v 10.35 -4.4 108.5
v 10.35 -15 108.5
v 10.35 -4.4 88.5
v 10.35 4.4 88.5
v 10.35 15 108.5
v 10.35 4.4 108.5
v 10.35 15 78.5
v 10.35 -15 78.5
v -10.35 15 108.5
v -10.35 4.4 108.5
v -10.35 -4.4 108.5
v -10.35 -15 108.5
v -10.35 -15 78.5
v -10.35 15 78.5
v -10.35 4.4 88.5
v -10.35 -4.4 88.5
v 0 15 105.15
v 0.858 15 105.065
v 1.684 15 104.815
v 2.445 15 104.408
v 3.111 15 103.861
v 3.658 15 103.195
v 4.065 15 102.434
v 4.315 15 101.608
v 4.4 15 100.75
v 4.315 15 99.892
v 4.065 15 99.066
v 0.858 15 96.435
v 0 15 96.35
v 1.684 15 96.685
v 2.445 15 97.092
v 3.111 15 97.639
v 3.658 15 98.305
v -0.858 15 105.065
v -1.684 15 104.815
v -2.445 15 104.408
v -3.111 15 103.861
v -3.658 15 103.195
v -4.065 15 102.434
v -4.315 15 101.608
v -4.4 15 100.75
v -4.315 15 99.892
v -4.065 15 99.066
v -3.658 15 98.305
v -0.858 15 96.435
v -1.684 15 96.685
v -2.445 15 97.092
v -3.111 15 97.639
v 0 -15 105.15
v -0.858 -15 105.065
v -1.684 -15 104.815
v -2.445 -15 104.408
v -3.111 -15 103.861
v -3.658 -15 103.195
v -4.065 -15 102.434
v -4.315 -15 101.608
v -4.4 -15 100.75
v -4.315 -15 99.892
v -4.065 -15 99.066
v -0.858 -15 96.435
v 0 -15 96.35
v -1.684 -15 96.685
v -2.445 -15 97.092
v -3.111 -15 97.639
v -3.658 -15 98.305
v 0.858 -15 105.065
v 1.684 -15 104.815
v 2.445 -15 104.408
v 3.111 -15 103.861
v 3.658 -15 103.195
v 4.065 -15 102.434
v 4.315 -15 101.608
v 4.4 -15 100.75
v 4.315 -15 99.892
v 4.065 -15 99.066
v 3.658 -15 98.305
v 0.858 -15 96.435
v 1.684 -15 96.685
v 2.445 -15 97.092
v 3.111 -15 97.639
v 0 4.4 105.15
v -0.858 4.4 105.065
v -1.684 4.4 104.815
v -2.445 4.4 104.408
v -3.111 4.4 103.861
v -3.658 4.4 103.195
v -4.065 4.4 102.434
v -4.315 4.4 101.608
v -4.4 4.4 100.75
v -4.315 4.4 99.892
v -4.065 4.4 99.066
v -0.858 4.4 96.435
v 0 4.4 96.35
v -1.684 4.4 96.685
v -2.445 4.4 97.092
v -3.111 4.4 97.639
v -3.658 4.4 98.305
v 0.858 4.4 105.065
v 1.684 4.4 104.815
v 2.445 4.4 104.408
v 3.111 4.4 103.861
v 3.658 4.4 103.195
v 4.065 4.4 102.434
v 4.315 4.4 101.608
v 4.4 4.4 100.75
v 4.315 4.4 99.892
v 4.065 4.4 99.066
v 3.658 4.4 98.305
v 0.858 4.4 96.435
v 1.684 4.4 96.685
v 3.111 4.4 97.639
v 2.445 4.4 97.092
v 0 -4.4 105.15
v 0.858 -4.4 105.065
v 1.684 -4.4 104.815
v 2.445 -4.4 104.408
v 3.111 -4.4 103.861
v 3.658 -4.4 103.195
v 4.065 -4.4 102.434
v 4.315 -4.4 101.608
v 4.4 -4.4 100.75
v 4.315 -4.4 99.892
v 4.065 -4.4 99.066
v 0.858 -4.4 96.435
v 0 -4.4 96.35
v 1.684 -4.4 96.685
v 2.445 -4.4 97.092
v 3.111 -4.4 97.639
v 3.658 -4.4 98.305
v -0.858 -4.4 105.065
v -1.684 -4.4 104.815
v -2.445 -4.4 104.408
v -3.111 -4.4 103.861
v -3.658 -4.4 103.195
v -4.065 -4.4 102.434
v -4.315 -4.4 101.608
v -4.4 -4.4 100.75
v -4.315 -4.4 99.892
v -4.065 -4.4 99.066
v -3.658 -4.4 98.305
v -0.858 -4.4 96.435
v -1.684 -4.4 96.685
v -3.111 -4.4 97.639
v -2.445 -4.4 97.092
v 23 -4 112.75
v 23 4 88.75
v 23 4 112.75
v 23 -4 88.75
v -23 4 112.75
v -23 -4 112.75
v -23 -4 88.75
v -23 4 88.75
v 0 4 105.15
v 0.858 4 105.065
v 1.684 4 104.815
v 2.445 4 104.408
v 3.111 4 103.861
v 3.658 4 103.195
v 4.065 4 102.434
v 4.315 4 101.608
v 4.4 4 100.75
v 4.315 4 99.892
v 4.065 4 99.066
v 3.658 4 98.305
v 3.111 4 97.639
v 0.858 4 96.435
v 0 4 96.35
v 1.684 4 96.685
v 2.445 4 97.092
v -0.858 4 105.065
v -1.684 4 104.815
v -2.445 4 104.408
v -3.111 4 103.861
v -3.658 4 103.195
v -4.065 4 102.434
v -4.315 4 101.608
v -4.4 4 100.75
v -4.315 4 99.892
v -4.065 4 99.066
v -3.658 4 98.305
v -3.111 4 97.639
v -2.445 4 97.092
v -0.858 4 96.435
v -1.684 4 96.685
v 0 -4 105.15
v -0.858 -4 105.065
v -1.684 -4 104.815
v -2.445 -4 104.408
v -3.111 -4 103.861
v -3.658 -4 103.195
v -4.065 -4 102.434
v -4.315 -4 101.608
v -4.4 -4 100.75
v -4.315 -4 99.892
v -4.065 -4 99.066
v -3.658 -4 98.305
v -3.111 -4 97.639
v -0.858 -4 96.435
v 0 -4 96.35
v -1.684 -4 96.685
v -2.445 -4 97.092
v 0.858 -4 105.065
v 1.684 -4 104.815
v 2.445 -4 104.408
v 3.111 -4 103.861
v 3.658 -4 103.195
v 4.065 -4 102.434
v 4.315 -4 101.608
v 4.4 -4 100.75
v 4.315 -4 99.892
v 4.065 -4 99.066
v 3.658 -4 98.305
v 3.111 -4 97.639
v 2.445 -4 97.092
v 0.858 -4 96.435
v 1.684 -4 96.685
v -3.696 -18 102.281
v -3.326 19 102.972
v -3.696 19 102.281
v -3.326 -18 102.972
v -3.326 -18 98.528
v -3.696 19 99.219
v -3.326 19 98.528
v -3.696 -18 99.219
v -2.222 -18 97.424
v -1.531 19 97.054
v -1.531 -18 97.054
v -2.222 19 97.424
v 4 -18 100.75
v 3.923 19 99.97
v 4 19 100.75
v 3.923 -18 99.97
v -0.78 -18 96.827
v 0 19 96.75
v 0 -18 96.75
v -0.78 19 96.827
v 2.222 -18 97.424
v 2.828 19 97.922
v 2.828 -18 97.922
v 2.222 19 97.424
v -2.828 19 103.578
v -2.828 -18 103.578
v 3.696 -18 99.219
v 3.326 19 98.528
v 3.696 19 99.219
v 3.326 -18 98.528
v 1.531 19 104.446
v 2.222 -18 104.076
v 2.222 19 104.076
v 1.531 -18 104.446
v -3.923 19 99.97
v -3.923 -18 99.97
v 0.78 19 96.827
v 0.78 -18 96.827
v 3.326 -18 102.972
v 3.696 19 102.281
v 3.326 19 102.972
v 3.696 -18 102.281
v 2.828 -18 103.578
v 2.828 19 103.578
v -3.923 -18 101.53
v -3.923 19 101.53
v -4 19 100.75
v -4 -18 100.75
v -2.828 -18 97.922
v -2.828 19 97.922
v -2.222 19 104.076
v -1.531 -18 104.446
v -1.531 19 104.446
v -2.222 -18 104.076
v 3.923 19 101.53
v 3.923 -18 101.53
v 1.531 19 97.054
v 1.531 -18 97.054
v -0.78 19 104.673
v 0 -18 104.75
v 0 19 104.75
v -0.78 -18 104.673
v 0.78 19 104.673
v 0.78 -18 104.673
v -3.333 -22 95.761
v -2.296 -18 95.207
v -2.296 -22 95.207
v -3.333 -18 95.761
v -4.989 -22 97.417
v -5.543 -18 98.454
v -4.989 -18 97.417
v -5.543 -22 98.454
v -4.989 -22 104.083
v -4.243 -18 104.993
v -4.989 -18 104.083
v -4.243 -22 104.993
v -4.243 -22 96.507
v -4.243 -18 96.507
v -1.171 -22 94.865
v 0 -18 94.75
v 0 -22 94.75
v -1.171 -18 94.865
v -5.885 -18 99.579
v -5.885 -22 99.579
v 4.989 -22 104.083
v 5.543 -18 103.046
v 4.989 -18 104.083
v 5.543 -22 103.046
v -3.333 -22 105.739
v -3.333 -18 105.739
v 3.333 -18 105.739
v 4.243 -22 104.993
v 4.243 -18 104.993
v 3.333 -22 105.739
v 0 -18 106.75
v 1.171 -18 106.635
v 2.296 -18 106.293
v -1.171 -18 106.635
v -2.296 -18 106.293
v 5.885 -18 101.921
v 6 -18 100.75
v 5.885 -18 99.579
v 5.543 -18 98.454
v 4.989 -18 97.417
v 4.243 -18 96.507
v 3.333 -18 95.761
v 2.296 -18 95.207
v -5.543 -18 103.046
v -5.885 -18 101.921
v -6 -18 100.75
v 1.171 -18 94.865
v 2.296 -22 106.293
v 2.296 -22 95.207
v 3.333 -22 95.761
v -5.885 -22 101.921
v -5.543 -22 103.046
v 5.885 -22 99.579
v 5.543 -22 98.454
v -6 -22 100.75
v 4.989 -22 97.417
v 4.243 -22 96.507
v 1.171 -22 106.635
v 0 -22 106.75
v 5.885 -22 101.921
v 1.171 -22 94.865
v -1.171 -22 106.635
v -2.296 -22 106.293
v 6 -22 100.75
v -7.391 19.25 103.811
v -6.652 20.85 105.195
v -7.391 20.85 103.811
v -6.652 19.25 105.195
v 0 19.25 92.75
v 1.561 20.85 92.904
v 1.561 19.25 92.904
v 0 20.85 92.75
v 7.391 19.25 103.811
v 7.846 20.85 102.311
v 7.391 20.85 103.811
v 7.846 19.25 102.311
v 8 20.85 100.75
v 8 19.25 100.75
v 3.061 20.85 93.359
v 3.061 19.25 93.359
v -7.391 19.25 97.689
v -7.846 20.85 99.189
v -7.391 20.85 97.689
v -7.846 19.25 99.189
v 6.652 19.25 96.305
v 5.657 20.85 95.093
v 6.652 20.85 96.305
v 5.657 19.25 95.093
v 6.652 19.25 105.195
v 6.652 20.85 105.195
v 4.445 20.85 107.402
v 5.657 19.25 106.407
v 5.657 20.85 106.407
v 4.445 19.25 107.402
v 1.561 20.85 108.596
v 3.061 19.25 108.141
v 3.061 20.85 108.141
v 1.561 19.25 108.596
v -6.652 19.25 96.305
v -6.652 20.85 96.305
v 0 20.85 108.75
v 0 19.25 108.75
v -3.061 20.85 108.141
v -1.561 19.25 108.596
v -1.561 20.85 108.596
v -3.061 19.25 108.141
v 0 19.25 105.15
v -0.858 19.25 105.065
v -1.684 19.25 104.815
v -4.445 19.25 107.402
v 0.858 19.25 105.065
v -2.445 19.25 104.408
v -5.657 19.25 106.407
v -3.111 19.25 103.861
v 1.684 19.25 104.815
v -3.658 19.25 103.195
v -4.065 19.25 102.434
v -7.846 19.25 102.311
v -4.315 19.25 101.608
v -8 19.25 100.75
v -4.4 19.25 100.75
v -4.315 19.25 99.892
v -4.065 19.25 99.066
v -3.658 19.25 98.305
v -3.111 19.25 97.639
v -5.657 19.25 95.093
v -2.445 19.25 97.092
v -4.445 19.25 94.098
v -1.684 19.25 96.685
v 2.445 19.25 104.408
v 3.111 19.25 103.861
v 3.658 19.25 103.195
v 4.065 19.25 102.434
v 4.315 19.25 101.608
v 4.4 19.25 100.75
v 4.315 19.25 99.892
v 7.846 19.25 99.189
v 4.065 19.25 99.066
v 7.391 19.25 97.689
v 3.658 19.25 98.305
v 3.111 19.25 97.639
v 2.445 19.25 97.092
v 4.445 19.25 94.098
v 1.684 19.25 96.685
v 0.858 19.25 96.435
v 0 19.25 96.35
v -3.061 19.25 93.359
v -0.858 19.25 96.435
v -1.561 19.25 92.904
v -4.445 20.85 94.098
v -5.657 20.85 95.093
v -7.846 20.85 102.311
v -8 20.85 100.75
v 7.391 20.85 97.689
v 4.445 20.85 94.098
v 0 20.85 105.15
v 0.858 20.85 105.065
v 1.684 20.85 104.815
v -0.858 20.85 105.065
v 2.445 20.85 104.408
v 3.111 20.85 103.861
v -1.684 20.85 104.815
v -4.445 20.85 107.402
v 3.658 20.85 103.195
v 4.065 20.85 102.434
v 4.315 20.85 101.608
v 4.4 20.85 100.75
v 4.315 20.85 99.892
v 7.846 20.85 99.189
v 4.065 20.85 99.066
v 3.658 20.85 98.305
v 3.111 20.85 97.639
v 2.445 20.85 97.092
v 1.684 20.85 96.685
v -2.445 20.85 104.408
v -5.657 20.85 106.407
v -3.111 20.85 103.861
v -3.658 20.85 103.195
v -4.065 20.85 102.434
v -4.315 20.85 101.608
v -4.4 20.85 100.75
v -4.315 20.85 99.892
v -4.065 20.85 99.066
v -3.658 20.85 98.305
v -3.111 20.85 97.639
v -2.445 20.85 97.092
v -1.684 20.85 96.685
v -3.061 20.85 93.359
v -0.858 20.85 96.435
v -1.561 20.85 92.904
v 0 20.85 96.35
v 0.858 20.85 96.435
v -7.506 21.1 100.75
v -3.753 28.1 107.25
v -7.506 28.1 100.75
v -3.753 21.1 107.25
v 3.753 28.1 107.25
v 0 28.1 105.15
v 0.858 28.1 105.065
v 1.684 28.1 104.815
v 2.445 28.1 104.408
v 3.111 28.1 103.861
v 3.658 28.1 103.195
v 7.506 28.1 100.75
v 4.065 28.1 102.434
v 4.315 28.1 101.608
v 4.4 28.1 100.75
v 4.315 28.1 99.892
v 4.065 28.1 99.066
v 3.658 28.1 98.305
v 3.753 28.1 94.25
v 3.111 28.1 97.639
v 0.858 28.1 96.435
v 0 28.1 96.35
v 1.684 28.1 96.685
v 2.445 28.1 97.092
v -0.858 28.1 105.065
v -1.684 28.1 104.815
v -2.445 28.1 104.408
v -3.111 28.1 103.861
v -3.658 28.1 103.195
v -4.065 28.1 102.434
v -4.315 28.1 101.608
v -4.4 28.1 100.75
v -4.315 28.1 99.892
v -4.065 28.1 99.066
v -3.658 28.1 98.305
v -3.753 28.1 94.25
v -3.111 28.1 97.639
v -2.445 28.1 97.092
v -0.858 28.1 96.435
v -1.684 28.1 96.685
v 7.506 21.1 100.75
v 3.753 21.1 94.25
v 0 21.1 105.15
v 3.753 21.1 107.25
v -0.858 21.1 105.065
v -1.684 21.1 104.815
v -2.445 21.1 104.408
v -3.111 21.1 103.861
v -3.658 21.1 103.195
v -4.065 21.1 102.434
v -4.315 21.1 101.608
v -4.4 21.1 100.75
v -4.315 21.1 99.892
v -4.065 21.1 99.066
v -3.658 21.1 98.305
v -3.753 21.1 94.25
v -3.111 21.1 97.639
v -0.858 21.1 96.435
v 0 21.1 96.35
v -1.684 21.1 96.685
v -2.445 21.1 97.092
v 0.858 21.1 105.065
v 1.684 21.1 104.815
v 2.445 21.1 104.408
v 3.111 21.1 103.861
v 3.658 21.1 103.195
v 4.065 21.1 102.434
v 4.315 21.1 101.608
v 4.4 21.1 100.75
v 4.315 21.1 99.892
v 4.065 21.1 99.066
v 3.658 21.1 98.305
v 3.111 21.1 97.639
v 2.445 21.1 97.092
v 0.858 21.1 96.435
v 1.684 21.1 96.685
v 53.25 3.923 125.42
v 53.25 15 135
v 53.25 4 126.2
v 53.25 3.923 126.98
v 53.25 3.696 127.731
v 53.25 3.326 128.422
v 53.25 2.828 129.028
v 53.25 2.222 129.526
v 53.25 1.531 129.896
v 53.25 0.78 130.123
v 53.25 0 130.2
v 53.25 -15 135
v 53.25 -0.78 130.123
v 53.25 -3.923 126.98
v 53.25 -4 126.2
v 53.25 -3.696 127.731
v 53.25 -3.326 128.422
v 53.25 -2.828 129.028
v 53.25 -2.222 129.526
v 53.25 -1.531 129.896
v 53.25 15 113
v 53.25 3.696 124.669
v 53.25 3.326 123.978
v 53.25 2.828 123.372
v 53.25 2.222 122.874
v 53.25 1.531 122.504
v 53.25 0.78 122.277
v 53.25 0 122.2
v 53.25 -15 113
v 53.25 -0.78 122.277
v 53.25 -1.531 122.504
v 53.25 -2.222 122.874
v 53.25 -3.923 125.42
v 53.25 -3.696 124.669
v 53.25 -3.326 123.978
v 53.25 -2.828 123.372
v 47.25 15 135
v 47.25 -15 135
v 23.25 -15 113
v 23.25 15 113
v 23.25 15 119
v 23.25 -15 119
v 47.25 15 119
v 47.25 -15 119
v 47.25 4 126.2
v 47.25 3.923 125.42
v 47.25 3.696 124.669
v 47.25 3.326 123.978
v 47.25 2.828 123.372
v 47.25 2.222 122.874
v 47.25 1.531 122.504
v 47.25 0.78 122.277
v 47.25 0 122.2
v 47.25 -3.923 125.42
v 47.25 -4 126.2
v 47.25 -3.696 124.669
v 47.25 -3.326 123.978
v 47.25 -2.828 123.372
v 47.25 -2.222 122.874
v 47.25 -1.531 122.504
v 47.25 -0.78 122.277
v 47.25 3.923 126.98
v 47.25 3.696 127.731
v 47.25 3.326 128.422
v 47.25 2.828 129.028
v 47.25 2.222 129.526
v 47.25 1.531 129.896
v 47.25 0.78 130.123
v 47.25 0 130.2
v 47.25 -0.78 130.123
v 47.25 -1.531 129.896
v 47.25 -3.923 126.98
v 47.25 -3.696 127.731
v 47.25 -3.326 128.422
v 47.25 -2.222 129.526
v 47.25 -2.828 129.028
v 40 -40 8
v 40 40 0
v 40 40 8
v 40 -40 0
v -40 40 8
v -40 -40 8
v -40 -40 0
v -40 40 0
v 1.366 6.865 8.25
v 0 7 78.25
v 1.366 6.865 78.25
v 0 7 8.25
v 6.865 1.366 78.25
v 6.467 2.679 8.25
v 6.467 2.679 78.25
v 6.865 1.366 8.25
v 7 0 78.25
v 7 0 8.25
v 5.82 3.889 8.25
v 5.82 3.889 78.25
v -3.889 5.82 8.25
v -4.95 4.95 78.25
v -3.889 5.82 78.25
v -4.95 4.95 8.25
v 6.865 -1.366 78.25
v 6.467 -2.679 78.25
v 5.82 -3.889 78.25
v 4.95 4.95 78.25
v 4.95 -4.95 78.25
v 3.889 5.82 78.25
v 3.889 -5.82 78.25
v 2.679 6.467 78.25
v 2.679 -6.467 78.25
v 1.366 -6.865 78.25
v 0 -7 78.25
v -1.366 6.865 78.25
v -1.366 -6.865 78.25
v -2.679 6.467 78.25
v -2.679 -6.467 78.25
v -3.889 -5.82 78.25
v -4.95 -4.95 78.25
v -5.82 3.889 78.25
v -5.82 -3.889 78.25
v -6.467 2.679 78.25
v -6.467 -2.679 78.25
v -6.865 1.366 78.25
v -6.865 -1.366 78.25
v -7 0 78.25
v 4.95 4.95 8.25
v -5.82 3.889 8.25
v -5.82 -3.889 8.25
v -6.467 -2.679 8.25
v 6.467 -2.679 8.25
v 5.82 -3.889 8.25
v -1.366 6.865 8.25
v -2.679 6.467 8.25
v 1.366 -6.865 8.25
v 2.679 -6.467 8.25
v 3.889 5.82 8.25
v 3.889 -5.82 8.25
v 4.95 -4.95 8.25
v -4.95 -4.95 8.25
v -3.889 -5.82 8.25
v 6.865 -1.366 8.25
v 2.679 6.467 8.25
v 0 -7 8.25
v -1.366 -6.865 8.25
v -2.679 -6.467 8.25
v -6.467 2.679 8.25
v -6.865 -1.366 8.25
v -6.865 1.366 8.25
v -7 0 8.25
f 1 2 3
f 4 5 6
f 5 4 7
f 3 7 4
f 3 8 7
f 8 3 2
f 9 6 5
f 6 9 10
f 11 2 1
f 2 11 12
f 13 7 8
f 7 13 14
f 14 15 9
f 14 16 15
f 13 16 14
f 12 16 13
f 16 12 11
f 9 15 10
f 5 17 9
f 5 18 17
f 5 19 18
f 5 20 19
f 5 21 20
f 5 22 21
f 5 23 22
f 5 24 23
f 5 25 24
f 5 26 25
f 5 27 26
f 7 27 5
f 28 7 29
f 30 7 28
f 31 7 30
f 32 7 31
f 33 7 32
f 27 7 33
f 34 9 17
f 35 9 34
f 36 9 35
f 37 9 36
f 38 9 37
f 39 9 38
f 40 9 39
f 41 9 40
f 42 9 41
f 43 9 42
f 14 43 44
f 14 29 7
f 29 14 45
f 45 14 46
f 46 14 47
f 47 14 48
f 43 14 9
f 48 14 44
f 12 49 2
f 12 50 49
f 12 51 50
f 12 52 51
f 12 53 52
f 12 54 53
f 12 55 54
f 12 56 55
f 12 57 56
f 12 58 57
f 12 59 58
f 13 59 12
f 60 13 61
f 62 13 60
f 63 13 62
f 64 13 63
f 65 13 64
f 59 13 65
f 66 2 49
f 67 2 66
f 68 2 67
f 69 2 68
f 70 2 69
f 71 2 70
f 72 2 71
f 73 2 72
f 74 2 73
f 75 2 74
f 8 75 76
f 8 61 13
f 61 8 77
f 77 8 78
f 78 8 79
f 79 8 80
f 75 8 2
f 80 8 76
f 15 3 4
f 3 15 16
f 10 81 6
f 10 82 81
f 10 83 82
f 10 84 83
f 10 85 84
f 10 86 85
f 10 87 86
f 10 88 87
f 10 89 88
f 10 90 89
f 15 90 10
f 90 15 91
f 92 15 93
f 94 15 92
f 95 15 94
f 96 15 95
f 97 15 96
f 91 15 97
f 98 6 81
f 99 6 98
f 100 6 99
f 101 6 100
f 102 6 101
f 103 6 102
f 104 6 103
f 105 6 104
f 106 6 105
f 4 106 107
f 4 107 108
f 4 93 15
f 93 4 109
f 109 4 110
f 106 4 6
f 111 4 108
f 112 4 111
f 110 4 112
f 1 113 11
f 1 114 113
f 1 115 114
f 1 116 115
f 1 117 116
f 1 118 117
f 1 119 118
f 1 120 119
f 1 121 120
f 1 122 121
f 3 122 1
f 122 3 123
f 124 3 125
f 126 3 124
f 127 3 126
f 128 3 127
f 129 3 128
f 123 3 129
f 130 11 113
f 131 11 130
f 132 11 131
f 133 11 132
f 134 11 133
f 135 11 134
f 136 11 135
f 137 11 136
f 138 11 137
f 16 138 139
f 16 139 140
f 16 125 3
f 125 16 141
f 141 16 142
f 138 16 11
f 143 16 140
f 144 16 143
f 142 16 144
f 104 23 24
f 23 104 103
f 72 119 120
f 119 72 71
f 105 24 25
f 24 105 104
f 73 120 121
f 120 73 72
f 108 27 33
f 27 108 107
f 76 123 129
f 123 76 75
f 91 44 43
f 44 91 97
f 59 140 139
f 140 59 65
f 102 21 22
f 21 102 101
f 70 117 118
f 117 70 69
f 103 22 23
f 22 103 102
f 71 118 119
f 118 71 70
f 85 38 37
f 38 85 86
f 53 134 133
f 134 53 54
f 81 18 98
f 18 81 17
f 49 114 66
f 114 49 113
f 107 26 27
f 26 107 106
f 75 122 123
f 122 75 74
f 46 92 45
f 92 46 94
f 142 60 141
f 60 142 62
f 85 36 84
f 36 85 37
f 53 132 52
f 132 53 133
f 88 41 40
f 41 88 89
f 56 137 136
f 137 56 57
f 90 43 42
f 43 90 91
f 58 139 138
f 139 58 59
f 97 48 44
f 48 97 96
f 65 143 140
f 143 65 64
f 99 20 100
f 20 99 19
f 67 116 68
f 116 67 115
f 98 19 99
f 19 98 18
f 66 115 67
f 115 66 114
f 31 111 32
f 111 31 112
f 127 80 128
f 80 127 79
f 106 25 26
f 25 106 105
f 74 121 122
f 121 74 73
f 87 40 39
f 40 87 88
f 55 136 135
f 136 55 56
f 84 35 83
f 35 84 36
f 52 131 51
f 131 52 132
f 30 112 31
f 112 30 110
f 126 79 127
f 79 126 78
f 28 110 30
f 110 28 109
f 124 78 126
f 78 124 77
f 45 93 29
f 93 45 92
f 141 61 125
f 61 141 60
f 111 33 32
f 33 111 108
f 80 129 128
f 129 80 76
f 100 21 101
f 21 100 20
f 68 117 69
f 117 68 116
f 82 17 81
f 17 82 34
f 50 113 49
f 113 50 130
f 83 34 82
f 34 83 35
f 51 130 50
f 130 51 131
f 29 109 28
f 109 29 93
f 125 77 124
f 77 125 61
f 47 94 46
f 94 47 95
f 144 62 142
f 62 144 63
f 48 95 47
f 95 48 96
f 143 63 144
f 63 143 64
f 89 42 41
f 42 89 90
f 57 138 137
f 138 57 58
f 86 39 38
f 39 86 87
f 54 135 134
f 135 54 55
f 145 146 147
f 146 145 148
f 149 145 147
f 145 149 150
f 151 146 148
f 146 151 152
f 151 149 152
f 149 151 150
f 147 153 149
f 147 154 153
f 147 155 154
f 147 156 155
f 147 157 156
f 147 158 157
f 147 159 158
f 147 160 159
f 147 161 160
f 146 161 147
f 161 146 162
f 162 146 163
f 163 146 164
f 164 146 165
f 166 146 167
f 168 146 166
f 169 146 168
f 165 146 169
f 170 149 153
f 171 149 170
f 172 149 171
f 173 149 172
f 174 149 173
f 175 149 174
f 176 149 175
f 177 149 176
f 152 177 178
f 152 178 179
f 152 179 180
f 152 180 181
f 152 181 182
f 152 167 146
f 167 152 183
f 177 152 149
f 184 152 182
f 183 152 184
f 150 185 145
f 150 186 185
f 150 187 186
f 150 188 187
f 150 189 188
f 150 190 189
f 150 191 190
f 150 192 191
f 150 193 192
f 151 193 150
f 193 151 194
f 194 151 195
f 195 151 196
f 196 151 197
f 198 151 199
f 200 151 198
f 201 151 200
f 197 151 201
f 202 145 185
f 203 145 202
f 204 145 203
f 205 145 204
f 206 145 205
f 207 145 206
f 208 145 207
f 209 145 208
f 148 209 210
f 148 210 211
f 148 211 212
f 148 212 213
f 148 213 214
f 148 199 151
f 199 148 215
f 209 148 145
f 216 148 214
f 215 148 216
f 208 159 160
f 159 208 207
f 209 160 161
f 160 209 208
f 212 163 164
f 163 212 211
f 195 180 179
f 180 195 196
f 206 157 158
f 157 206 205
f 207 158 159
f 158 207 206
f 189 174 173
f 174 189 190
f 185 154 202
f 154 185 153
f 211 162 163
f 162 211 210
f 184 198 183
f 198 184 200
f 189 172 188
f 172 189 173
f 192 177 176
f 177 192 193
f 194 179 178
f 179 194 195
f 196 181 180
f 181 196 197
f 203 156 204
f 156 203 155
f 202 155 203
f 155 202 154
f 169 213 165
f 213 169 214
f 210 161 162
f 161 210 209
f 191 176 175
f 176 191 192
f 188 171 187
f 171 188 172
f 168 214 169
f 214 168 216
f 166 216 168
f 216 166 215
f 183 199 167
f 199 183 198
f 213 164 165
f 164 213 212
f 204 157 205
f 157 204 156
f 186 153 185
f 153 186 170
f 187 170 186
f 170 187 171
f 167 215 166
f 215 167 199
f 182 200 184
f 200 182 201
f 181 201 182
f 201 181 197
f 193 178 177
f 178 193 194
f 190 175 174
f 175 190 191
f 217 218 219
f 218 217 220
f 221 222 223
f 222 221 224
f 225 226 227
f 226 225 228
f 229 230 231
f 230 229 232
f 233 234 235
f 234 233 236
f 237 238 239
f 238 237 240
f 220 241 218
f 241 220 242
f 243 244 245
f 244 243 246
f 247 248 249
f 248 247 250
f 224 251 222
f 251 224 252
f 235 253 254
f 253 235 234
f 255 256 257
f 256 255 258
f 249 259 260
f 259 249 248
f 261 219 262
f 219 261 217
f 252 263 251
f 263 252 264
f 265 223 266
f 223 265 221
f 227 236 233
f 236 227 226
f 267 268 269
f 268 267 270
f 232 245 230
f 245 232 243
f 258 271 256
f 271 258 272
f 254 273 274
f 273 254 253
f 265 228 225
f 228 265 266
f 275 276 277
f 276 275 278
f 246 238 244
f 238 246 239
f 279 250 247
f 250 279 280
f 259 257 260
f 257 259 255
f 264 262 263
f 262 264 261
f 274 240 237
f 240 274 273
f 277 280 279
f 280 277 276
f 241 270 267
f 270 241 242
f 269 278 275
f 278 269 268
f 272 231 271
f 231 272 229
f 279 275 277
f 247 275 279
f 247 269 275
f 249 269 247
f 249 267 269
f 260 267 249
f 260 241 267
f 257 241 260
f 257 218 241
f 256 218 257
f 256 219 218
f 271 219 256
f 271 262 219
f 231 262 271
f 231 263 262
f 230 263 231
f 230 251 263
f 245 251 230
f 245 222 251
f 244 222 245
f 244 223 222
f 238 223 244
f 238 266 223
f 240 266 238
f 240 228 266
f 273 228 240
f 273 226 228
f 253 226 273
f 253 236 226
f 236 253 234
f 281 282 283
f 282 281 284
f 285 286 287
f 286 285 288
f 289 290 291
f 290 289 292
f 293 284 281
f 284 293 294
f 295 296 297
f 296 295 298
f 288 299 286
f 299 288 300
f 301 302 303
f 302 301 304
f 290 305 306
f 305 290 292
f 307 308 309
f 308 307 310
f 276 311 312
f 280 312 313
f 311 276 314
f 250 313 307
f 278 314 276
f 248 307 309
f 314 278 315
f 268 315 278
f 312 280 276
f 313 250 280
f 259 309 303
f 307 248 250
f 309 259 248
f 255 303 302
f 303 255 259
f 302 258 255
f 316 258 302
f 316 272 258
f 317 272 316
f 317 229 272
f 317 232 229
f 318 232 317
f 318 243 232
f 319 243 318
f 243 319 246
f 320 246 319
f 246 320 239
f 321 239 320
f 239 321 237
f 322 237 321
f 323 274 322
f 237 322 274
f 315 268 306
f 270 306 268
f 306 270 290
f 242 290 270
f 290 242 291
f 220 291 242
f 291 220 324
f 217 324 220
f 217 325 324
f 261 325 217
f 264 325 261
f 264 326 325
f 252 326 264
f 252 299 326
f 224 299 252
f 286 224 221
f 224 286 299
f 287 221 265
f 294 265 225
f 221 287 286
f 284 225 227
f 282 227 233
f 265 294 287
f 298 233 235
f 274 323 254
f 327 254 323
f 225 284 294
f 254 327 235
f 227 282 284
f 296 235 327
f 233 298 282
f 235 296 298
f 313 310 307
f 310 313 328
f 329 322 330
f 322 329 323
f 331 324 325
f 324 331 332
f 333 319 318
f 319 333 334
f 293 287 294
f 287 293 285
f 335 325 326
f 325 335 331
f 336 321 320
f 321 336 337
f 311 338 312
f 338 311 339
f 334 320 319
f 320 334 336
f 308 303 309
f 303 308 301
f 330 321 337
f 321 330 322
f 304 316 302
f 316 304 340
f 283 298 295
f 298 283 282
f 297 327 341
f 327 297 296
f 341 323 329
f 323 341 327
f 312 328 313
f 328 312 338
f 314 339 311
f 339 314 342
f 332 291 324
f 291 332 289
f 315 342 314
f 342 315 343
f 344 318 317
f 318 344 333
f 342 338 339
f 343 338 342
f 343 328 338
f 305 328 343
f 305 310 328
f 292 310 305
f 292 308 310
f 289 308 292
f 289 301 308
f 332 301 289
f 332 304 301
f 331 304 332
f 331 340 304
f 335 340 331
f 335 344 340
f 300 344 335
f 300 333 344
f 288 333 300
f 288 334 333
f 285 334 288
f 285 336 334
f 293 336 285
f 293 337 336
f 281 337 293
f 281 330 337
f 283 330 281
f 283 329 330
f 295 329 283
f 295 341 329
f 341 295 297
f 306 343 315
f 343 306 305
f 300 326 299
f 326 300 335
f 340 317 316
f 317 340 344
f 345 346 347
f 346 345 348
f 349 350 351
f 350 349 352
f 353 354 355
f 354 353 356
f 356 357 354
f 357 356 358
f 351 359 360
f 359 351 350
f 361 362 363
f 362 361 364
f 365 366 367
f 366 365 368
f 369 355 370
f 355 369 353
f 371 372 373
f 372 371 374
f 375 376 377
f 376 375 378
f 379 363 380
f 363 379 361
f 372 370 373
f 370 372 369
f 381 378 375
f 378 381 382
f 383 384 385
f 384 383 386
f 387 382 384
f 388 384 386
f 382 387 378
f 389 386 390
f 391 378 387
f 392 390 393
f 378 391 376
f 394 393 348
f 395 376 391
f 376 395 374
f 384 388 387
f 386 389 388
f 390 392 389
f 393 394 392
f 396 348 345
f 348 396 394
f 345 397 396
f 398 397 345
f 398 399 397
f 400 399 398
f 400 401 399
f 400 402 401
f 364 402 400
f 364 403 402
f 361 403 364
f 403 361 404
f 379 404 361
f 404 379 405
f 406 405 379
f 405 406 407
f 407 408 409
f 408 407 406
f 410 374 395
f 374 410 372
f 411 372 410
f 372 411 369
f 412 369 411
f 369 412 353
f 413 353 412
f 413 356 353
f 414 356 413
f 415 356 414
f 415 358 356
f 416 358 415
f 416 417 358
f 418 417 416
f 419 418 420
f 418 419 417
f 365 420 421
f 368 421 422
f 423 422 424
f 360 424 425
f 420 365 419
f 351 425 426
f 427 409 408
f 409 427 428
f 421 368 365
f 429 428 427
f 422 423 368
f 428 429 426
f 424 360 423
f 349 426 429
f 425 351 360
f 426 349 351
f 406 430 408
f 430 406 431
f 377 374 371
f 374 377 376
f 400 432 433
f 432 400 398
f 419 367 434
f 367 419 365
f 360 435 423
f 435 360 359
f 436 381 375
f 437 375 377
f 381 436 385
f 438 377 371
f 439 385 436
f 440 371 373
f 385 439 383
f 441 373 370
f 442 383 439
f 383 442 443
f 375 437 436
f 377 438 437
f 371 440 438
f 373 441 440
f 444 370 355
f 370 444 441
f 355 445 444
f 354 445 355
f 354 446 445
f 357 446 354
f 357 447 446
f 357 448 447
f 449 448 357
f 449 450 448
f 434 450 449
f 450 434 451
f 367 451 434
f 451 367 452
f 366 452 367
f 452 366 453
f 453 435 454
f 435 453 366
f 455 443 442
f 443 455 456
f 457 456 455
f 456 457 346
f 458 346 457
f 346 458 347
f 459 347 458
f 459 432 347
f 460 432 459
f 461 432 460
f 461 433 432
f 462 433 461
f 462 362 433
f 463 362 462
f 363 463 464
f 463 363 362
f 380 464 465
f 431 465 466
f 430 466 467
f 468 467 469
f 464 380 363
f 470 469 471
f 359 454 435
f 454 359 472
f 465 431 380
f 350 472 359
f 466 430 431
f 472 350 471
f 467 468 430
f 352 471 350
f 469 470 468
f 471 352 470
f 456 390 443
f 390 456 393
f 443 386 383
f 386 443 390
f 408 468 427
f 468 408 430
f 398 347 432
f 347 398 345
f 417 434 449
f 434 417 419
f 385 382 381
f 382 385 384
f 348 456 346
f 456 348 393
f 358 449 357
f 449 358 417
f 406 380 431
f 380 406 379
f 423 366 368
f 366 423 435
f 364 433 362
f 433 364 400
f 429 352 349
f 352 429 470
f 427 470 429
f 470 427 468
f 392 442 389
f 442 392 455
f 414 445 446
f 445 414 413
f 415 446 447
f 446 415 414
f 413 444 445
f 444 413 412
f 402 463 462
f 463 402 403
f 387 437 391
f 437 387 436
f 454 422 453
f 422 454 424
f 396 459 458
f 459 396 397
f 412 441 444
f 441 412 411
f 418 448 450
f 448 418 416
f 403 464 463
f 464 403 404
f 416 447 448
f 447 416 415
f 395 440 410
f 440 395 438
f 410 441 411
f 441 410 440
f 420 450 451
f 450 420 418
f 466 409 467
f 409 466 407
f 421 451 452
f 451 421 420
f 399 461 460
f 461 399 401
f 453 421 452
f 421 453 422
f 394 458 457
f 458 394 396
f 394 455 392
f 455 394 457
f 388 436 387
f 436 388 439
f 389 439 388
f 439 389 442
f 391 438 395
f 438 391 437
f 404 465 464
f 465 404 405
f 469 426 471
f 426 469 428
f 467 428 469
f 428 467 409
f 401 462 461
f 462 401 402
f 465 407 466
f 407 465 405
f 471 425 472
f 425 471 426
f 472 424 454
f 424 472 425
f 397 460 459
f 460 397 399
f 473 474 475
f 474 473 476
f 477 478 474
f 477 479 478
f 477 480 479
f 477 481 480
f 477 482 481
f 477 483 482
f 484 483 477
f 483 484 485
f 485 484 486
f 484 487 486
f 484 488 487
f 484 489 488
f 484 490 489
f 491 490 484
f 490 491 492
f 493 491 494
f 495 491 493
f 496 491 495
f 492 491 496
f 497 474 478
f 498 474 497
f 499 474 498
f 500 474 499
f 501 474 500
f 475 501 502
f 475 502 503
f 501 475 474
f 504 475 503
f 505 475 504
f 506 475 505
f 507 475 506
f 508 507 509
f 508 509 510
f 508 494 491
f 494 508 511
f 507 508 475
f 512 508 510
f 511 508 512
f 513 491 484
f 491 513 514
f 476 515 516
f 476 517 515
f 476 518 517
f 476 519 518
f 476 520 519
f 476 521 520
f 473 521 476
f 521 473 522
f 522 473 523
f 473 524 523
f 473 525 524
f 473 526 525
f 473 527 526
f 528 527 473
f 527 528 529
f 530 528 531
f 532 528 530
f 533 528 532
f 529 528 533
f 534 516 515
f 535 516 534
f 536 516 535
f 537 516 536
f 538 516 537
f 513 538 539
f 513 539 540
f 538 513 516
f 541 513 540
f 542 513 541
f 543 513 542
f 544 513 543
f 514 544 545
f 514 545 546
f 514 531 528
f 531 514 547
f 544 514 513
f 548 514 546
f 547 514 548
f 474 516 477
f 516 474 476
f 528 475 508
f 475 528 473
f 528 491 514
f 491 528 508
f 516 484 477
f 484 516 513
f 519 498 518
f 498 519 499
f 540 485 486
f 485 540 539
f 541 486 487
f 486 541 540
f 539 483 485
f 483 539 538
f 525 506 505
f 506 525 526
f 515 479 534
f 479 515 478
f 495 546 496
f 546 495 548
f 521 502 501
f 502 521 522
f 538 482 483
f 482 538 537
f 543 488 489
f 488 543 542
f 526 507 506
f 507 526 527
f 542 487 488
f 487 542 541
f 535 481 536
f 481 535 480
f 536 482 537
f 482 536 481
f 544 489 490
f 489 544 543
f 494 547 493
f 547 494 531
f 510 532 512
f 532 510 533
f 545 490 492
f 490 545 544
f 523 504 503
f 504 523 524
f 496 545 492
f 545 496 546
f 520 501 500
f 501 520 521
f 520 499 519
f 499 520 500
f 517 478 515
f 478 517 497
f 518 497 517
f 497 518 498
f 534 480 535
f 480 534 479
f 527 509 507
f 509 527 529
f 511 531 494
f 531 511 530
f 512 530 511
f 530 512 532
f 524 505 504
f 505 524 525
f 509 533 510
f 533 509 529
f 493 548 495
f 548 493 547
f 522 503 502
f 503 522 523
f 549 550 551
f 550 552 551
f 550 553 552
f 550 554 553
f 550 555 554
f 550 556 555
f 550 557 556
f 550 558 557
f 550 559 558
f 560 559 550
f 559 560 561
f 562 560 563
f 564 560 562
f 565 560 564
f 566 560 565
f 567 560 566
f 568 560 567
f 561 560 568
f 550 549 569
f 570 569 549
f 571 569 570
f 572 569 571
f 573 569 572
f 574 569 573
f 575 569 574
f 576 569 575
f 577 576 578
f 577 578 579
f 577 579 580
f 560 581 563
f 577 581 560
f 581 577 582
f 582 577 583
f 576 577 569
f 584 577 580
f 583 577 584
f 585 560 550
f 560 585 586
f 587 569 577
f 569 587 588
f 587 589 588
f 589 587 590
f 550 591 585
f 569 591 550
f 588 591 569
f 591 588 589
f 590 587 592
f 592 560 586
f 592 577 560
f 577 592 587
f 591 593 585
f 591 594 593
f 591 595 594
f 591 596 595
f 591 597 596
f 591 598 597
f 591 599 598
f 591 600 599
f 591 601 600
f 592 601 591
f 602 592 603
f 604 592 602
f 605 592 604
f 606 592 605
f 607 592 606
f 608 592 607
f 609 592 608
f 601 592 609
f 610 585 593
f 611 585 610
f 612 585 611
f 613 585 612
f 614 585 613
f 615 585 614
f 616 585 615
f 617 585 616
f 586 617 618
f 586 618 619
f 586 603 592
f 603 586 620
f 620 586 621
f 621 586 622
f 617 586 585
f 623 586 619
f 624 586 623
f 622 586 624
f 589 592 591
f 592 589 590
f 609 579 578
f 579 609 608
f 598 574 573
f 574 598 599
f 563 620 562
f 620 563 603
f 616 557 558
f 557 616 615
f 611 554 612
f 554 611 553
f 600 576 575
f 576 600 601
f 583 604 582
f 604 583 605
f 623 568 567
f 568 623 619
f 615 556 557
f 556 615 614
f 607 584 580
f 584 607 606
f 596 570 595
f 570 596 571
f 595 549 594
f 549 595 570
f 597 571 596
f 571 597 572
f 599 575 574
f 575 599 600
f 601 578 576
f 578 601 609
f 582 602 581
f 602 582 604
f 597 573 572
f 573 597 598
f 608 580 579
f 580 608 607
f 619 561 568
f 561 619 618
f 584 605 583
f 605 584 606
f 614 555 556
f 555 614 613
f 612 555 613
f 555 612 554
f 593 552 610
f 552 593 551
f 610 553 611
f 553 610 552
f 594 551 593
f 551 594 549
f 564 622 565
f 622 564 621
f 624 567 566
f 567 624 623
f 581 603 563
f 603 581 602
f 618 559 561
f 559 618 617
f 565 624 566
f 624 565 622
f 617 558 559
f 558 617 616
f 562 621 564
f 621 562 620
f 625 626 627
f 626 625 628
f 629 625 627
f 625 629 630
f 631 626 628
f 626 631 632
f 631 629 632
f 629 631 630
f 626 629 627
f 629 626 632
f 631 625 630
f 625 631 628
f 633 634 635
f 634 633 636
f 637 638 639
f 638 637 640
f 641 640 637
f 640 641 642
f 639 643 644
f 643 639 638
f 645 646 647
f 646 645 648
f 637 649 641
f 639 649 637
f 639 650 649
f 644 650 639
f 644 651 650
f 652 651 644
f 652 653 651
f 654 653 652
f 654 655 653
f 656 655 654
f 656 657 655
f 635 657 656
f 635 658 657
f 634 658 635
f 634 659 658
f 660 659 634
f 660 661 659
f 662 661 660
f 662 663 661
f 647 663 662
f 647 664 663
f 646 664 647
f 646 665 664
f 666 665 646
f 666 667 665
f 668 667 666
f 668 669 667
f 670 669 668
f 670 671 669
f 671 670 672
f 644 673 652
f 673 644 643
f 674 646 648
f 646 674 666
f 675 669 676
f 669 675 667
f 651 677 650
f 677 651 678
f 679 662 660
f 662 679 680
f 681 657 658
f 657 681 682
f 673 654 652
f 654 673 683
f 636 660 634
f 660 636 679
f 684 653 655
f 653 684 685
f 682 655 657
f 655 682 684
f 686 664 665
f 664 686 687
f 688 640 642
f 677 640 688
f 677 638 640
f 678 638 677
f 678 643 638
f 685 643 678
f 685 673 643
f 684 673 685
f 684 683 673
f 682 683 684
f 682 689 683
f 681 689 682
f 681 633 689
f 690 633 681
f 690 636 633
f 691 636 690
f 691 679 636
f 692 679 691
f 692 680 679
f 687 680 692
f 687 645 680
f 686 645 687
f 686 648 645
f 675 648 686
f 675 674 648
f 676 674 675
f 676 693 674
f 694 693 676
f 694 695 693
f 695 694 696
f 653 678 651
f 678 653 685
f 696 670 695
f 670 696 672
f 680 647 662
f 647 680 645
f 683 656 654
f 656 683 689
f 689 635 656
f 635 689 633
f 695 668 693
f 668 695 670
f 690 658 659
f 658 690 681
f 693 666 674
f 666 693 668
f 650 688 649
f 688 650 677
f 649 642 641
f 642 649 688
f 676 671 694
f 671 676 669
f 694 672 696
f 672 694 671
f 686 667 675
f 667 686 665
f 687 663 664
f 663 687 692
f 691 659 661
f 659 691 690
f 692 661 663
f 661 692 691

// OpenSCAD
$fn = 32;

// ------------------------------------------------------------------------
// Lamp arm: column d14 x 70 mm, arm 46 mm
// Every part is its own module, assembly() places every instance.
// ------------------------------------------------------------------------

// --- part 1 ---
module lamp_base() {
  difference() {
    translate([-40, -40, 0]) cube([80, 80, 8]);
  }
}

// --- part 2 ---
module lamp_column() {
  cylinder(h = 70, d = 14);
}

// --- part 3 ---
module head_fork() {
  difference() {
    translate([-10.35, -15, 0]) cube([20.7, 30, 30]);
    translate([-11.35, -4.4, 10]) cube([22.7, 8.8, 21]);
    translate([0, 0, 22.25]) rotate([90, 0, 0]) cylinder(h = 32, d = 8.8, center = true);
  }
}

// --- part 4 ---
module lamp_arm() {
  difference() {
    translate([-23, -4, 0]) cube([46, 8, 24]);
    translate([0, 0, 12]) rotate([90, 0, 0]) cylinder(h = 10, d = 8.8, center = true);
  }
}

// --- part 5 ---
module arm_pin() {
  rotate([0, 90, 0]) cylinder(h = 38, d = 8, center = true);
  translate([-22, 0, 0]) rotate([0, 90, 0]) cylinder(h = 4, d = 12);
}

// --- part 6 ---
module arm_washer() {
  difference() {
      translate([0, 0, 0]) cylinder(h = 1.6, d = 16);
      translate([0, 0, -1]) cylinder(h = 3.6, d = 8.8);
    }
}

// --- part 7 ---
module arm_nut() {
  difference() {
    linear_extrude(height = 7) polygon(points = [[7.506, 0], [3.753, 6.5], [-3.753, 6.5], [-7.506, 0], [-3.753, -6.5], [3.753, -6.5]]);
    translate([0, 0, -1]) cylinder(h = 9, d = 8.8);
  }
}

// --- part 8 ---
module shade_bracket() {
  difference() {
    translate([-15, -15, 0]) cube([30, 30, 22]);
    translate([-16, -16, 6]) cube([25, 32, 17]);
    translate([12, 0, 13.2]) rotate([0, 90, 0]) cylinder(h = 8, d = 8, center = true);
  }
}

// --- assembly ---
module assembly() {
  color([0.80, 0.24, 0.20]) translate([0, 0, 0]) rotate([0, 0, 0]) lamp_base();
  color([0.20, 0.45, 0.75]) translate([0, 0, 8.25]) rotate([0, 0, 0]) lamp_column();
  color([0.25, 0.62, 0.32]) translate([0, 0, 78.5]) rotate([0, 0, 0]) head_fork();
  color([0.92, 0.70, 0.18]) translate([0, 0, 88.75]) rotate([0, 0, 0]) lamp_arm();
  color([0.58, 0.35, 0.70]) translate([0, 0, 100.75]) rotate([0, 0, 90]) arm_pin();
  color([0.16, 0.66, 0.66]) translate([0, 20.85, 100.75]) rotate([90, 0, 0]) arm_washer();
  color([0.85, 0.48, 0.18]) translate([0, 28.1, 100.75]) rotate([90, 0, 0]) arm_nut();
  color([0.55, 0.60, 0.65]) translate([38.25, 0, 113]) rotate([0, 0, 0]) shade_bracket();
}

assembly();
